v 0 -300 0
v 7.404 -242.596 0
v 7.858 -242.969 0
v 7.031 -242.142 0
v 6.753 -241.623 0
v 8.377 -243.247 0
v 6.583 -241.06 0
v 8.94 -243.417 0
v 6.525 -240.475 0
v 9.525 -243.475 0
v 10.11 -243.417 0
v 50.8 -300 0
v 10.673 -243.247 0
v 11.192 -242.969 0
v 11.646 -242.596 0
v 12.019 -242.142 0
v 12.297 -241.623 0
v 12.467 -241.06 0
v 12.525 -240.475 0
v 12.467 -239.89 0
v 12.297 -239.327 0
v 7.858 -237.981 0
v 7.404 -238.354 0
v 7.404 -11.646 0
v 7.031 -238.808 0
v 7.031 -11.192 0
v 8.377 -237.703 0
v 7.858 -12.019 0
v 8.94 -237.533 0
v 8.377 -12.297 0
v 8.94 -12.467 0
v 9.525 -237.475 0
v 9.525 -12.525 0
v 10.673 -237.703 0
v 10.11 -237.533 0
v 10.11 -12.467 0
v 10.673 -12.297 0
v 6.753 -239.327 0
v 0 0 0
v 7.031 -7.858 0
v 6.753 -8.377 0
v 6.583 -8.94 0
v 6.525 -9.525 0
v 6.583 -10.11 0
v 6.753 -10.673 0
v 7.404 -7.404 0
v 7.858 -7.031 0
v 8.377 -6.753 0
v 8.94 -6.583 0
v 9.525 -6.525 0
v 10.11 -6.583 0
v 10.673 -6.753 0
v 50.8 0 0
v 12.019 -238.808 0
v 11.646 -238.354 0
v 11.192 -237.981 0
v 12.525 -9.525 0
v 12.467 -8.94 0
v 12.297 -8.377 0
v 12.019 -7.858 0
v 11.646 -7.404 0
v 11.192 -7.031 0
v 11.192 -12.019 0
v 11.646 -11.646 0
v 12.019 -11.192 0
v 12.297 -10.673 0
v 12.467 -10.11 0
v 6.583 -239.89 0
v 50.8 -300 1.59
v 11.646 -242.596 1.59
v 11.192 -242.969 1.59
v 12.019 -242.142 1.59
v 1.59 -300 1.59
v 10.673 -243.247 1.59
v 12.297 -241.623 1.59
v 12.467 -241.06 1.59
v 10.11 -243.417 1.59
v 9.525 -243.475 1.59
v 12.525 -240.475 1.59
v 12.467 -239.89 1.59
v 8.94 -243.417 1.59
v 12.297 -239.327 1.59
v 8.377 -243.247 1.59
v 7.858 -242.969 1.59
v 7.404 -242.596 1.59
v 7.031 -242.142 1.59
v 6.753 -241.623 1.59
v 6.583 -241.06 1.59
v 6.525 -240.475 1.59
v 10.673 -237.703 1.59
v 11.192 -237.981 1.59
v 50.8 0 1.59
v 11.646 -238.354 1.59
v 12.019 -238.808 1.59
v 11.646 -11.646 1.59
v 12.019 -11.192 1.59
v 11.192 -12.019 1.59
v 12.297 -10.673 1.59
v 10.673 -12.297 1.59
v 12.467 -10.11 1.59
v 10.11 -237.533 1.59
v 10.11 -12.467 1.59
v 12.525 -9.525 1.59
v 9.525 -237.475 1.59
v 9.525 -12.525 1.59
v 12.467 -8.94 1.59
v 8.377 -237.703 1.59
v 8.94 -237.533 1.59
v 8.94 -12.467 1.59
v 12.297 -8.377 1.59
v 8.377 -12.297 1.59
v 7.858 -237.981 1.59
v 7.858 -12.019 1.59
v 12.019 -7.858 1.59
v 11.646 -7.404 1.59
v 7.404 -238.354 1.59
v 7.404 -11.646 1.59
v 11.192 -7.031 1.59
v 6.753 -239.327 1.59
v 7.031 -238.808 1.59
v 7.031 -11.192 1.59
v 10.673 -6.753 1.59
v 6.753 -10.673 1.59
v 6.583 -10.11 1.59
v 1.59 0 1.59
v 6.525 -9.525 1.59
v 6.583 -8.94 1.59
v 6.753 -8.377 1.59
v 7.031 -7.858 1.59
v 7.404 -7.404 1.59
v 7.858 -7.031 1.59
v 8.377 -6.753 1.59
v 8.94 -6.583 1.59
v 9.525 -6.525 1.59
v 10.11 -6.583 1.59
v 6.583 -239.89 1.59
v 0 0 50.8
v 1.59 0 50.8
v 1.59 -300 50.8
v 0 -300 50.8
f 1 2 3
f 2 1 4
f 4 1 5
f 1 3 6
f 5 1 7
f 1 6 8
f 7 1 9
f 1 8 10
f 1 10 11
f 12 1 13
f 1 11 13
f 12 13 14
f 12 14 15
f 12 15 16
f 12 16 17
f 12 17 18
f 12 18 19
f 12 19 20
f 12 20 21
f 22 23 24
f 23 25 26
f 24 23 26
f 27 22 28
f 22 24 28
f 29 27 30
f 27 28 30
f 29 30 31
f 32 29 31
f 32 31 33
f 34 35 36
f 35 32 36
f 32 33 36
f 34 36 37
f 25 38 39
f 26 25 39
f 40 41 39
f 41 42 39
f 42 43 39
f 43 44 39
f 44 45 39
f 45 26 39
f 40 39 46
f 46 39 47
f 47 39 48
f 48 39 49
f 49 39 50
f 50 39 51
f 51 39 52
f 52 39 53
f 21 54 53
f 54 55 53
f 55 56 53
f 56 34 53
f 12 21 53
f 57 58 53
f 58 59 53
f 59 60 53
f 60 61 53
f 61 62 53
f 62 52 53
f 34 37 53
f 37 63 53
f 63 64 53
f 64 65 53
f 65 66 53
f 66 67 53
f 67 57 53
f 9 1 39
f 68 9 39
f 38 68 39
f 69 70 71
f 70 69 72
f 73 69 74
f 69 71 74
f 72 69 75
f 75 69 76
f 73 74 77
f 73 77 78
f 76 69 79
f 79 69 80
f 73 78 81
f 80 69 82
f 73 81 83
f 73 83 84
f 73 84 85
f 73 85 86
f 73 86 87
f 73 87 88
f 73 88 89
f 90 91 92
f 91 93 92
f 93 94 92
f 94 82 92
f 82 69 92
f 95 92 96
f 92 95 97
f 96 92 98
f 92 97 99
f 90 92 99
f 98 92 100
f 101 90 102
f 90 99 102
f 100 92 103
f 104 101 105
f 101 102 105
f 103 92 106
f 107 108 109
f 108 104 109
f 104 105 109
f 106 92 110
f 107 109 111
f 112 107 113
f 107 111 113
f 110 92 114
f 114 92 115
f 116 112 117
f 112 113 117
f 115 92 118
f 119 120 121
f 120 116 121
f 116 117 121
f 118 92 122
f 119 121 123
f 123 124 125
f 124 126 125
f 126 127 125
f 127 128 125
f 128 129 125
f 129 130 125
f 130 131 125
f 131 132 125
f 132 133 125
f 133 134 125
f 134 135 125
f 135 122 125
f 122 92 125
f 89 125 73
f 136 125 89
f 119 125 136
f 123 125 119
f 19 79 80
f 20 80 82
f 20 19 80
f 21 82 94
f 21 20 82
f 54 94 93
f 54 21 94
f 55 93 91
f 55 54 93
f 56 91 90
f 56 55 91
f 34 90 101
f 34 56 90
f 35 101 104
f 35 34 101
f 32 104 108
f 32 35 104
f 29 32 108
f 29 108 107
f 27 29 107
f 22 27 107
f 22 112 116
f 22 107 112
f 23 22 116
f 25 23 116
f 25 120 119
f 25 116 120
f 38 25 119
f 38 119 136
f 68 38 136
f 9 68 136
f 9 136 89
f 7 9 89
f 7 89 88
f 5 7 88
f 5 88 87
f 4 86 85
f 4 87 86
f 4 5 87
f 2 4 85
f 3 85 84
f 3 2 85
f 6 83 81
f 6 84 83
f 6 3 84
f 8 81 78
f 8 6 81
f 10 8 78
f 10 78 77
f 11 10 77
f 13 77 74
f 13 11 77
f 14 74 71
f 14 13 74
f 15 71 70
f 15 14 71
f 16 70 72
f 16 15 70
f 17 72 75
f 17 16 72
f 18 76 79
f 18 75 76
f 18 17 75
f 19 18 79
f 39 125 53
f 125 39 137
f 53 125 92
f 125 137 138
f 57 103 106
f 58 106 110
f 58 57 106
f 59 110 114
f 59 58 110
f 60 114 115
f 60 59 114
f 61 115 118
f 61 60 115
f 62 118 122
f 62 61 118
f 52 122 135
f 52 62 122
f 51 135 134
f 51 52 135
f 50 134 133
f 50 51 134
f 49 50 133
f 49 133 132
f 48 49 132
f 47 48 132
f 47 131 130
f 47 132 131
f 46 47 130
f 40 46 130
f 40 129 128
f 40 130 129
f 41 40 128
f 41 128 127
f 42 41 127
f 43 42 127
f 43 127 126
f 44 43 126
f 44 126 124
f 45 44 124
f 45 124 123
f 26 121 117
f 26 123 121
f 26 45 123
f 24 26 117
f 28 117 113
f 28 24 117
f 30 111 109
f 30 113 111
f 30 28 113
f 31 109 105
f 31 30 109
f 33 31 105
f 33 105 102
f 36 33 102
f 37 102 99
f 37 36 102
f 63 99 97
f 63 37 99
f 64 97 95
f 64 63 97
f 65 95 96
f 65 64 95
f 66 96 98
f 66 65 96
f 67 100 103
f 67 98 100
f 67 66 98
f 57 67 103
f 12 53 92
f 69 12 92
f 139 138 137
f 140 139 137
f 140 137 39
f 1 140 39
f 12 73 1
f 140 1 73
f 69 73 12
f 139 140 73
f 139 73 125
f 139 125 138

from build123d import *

# Parameters (mm, degrees)
F1_DEPTH = 300
F2_R     = 3
F3_DEPTH = 50.801


with BuildPart() as f1:
    # F0 (on Front) → F1 (new body)
    with BuildSketch(Plane.XZ):
        Polygon((0, 50.8), (0, 0), (50.8, 0), (50.8, 1.59), (1.59, 1.59), (1.59, 50.8), align=None)
    extrude(amount=F1_DEPTH)

    # F2 (on Top) → F3 (cut, through all)
    with BuildSketch(Plane.XY):
        with Locations((9.525, -9.525)):
            Circle(F2_R)
        with Locations((9.525, -240.475)):
            Circle(F2_R)
    extrude(amount=F3_DEPTH, mode=Mode.SUBTRACT)


solid = f1.part
